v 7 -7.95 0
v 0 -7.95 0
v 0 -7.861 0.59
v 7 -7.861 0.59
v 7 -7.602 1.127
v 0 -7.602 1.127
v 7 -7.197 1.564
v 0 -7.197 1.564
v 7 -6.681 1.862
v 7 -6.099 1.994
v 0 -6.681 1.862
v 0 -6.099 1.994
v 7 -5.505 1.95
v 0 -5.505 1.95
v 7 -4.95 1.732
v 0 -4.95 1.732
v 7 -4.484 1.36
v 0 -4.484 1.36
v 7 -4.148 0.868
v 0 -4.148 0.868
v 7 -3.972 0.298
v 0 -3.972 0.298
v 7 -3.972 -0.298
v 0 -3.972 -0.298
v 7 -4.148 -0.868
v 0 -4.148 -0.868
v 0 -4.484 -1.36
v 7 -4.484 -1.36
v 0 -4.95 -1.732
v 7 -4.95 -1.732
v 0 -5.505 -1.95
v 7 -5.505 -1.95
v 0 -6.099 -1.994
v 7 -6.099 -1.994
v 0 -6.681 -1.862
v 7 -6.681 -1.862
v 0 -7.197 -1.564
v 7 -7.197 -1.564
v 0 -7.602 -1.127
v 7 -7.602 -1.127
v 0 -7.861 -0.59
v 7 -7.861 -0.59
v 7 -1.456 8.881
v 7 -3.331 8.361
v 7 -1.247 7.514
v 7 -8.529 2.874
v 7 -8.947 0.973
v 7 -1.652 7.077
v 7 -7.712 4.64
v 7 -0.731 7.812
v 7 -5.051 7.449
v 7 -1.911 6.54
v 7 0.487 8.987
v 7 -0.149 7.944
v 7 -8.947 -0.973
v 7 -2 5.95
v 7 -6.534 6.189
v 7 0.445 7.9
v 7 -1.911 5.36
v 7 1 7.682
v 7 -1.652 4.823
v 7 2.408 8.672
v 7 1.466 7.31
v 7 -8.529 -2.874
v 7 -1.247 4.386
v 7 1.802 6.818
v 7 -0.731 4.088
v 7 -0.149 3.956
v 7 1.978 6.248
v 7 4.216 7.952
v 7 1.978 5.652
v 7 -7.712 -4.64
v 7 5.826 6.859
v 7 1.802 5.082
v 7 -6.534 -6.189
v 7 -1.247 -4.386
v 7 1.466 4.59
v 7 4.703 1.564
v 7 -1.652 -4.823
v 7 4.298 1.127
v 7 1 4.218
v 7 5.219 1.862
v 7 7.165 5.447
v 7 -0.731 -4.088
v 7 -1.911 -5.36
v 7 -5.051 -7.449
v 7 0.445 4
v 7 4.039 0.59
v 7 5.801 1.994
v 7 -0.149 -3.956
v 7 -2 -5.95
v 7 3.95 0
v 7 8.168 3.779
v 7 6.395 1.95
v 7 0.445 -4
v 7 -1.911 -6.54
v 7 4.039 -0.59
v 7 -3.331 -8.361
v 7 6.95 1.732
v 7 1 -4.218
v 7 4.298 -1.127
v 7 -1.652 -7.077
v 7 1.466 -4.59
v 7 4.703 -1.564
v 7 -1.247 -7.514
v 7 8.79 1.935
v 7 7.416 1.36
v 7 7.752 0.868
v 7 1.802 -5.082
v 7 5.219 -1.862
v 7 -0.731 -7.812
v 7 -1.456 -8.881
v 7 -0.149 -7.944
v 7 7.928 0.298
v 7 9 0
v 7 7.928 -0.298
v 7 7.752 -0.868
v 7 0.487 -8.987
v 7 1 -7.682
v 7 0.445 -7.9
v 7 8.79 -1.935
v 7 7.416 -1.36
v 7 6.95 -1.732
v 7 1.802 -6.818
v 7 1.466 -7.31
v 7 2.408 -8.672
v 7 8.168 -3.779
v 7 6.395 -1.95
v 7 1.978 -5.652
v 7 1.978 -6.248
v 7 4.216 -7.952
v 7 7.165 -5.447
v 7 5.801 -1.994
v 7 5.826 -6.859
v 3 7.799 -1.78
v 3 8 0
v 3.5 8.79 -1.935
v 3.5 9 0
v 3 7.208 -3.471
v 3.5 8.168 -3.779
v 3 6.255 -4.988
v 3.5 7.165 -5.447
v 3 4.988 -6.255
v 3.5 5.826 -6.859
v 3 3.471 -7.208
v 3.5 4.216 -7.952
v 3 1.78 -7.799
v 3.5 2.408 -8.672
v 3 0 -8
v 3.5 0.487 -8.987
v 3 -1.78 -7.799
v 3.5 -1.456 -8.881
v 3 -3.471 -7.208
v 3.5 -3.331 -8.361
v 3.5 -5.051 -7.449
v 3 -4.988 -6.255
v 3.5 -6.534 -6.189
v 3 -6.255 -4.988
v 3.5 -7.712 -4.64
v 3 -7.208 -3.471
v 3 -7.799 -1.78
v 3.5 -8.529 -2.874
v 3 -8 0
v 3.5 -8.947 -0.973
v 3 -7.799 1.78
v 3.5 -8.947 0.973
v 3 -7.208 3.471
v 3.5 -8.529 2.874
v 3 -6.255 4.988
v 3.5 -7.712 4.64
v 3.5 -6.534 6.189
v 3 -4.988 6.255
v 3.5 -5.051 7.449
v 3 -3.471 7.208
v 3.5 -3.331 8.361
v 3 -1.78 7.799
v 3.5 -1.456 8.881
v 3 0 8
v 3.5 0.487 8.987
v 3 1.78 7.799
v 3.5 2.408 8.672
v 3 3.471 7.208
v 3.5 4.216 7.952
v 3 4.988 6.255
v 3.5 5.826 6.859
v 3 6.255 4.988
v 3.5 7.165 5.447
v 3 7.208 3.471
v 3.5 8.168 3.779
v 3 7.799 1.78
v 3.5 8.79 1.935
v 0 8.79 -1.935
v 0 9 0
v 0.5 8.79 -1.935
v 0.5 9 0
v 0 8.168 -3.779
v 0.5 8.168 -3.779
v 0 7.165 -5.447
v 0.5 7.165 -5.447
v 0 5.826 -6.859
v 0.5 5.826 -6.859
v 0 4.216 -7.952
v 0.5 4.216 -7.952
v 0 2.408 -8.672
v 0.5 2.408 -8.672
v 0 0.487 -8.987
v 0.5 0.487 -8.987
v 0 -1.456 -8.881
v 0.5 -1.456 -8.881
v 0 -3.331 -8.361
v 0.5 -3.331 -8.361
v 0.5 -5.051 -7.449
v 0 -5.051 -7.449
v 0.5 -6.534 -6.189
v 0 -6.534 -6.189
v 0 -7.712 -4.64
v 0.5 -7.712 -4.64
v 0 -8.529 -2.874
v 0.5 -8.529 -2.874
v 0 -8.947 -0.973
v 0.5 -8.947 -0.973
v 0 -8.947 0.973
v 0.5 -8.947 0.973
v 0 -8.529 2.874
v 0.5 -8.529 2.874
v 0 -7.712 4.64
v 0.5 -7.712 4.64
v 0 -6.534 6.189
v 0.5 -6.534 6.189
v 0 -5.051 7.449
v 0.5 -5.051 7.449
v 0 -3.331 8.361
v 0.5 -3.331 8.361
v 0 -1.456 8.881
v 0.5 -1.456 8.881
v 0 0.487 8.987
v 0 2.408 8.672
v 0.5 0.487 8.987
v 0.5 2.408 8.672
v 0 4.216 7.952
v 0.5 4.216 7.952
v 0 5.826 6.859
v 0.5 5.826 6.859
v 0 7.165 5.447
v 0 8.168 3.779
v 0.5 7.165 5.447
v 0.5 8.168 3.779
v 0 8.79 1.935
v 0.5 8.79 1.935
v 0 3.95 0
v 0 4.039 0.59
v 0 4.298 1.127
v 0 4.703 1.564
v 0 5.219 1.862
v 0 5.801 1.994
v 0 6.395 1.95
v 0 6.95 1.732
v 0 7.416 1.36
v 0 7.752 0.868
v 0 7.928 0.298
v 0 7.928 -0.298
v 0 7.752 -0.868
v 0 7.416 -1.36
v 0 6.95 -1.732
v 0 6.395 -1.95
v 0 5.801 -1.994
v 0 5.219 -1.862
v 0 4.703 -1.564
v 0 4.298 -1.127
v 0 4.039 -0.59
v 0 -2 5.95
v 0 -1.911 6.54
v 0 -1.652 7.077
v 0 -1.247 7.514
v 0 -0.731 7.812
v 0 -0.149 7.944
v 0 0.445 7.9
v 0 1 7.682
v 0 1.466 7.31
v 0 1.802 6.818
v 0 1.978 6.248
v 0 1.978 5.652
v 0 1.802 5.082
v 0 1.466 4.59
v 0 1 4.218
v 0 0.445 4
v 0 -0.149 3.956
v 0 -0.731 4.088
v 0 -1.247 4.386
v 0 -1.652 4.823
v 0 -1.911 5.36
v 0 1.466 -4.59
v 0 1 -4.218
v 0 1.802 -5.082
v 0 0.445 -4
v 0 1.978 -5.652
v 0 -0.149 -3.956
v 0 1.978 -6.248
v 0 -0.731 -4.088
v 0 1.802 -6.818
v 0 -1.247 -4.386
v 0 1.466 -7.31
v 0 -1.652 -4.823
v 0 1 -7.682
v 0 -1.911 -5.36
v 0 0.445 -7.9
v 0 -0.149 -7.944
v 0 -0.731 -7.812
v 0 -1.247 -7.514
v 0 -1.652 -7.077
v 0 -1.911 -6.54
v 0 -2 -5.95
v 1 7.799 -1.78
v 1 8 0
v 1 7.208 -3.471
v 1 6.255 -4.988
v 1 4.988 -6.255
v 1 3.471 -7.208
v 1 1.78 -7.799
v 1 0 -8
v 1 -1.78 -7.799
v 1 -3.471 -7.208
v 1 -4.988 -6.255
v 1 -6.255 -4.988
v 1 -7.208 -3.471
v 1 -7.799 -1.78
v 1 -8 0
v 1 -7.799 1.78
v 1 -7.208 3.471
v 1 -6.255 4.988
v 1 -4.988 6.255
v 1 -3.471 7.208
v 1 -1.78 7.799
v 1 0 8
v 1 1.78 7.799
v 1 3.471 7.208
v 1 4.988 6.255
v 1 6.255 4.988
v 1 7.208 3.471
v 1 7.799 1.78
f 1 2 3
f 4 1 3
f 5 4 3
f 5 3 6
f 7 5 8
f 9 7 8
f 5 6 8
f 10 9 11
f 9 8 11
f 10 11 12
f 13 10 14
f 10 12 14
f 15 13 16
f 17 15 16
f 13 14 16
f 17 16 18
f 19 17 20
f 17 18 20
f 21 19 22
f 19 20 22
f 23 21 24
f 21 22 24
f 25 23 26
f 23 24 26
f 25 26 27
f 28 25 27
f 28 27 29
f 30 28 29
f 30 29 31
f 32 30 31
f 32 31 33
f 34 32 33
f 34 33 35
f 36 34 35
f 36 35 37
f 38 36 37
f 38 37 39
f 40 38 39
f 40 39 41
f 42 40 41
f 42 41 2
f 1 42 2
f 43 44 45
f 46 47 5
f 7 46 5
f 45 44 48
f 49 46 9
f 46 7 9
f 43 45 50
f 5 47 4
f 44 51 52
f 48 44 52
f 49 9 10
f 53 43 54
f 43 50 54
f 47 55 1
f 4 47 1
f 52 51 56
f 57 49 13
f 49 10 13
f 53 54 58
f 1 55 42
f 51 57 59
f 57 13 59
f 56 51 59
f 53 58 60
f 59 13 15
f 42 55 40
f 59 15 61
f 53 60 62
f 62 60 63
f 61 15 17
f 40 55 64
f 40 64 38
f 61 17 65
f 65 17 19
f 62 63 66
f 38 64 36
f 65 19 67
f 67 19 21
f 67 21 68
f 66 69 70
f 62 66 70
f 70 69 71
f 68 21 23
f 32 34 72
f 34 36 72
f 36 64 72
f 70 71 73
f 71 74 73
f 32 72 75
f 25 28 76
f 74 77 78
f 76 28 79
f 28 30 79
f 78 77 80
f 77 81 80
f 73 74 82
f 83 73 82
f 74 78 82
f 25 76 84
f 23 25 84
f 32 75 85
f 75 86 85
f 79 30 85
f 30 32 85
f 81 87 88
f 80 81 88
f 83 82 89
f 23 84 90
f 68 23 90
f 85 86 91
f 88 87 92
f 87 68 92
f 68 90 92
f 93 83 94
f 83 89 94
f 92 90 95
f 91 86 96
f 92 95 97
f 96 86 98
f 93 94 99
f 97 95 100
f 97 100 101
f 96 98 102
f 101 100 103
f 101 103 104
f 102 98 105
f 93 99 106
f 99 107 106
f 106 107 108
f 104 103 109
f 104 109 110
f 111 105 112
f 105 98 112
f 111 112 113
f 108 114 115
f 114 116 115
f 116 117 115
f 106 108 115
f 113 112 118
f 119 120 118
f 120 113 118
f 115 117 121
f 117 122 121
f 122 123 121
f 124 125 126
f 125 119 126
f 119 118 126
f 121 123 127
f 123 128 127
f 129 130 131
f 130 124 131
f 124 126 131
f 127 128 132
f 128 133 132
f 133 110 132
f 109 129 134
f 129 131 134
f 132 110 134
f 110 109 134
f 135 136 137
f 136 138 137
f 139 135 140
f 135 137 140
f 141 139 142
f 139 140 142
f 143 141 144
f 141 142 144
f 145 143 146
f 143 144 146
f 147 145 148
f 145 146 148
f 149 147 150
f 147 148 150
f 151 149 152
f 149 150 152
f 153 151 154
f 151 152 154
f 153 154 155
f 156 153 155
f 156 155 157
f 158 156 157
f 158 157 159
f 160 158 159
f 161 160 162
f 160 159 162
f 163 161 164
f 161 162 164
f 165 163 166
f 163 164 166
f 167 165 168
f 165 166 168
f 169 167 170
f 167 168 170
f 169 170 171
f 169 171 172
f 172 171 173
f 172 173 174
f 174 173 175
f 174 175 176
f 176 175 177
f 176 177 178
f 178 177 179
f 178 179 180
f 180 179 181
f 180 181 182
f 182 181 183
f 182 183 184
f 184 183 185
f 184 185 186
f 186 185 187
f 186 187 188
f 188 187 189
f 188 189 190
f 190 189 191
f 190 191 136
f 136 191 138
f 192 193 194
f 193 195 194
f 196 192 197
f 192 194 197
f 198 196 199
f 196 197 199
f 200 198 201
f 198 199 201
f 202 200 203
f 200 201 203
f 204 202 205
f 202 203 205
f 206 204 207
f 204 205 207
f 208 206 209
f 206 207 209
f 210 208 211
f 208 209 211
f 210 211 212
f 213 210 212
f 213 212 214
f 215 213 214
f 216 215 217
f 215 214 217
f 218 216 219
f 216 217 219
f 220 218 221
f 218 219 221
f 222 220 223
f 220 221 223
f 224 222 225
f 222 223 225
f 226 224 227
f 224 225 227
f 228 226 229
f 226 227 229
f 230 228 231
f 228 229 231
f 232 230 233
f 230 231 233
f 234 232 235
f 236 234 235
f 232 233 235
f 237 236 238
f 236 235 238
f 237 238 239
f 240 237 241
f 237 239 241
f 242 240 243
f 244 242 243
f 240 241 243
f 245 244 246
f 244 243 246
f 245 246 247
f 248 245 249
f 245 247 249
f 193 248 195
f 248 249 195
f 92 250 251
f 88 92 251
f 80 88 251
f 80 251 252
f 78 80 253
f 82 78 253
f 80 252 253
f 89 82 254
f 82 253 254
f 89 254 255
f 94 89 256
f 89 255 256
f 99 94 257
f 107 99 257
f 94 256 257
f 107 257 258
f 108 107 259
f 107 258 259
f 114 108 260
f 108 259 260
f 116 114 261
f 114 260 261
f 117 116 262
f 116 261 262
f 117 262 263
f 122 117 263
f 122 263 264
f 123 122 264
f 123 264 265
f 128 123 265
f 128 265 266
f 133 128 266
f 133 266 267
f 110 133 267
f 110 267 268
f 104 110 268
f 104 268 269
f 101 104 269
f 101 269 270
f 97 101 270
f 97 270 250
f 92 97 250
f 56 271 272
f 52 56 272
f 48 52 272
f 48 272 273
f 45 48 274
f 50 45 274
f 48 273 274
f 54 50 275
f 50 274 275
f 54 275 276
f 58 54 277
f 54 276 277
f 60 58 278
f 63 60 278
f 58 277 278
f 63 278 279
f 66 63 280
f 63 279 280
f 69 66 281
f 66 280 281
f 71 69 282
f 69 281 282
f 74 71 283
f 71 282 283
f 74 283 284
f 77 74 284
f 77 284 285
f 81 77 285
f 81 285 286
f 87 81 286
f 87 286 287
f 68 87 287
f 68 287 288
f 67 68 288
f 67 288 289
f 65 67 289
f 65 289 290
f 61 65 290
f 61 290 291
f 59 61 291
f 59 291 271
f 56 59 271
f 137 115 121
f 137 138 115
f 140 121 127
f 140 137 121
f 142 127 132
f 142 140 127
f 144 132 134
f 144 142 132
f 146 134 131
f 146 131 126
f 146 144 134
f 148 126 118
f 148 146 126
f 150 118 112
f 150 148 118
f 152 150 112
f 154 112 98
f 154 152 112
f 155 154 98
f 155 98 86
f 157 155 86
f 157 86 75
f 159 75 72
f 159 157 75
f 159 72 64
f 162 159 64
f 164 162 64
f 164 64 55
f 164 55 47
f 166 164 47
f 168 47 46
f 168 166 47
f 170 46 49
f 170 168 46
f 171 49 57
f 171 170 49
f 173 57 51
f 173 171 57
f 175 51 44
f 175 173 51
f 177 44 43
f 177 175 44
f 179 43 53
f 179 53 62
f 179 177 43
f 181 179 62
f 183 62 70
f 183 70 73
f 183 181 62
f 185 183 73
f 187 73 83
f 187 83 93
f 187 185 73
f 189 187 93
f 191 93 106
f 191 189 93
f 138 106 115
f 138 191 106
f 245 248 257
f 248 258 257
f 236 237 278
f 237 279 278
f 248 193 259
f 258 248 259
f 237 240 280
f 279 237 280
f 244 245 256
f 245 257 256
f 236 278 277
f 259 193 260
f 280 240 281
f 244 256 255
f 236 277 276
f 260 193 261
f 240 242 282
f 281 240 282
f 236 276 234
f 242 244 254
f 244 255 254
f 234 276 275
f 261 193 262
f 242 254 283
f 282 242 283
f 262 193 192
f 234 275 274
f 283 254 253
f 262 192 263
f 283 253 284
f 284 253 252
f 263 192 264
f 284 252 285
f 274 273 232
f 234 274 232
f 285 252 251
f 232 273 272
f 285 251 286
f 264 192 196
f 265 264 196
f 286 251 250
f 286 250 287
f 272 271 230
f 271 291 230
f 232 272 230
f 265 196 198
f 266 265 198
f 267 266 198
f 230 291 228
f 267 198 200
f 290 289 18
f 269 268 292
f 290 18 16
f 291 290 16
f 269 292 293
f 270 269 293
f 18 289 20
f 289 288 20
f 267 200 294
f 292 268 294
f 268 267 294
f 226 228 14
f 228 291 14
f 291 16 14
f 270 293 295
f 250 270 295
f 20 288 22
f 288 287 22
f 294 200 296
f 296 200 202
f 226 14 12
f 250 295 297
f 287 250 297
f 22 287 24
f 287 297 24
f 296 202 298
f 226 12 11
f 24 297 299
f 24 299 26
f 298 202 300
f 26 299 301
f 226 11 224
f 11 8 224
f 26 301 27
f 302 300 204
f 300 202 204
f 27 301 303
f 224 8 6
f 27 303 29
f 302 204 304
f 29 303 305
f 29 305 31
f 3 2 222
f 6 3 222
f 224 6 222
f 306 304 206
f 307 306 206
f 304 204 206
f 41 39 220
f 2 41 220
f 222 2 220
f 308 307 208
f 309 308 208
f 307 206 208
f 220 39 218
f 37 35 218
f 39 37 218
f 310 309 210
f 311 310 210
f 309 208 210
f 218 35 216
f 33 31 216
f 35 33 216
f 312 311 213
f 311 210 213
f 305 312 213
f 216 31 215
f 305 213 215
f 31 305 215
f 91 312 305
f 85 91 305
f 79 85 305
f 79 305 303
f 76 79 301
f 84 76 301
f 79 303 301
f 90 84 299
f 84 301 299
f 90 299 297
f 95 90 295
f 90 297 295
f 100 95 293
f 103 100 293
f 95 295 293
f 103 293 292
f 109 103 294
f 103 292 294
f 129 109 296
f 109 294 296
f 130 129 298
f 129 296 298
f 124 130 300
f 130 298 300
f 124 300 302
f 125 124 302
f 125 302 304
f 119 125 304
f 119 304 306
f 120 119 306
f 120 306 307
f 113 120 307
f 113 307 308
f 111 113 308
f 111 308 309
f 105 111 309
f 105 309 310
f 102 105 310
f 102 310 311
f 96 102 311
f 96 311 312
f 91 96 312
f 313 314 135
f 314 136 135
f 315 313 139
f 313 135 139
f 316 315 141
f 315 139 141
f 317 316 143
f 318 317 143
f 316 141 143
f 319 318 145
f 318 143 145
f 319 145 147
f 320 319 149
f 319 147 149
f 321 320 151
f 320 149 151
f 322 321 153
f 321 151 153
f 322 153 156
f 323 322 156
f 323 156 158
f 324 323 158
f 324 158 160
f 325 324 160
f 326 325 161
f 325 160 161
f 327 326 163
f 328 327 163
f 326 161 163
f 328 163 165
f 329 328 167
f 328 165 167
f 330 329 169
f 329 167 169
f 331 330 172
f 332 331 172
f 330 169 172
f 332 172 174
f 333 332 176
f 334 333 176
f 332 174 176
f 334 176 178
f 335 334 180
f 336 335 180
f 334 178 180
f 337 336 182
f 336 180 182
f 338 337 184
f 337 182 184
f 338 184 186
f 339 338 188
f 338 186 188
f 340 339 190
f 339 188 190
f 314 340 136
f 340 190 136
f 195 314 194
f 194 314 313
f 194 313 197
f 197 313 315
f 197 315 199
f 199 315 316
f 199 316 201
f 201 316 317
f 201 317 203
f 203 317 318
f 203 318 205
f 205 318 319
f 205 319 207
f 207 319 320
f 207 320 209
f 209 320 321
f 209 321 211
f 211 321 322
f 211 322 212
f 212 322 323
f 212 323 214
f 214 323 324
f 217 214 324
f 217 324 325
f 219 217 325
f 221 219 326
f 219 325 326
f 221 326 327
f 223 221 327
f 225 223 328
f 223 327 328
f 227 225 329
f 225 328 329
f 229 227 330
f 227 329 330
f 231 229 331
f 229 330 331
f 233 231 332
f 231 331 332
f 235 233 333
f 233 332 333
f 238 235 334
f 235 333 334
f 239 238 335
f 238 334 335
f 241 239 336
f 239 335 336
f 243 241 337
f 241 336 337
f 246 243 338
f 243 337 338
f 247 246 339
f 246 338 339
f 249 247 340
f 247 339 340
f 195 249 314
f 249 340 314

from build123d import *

# Parameters (mm, degrees)
ESQUISSE2_R             = 2
ENL_V_MAT_EXTRU_1_DEPTH = 10


with BuildPart() as part:
    # Esquisse1 → Révolution1 (revolve)
    with BuildSketch(Plane.XY):
        Polygon((0, 0), (0, 9), (0.5, 9), (1, 8), (3, 8), (3.5, 9), (4, 9), (7, 9), (7, 0), (4, 0), align=None)
    revolve(axis=Axis((4, 0, 0), (-1, 0, 0)))

    # Esquisse2 → Enlèv. mat.-Extru.1 (cut)
    with BuildSketch(Plane.ZY):
        with Locations(Location((0, 5.95, 0), (0, 0, 270))):
            Circle(ESQUISSE2_R)
        with Locations(Location((5.95, 0, 0), (0, 0, 270))):
            Circle(ESQUISSE2_R)
        with Locations(Location((0, -5.95, 0), (0, 0, 270))):
            Circle(ESQUISSE2_R)
        with Locations(Location((-5.95, 0, 0), (0, 0, 270))):
            Circle(ESQUISSE2_R)
    extrude(amount=-ENL_V_MAT_EXTRU_1_DEPTH, mode=Mode.SUBTRACT)


solid = part.part
